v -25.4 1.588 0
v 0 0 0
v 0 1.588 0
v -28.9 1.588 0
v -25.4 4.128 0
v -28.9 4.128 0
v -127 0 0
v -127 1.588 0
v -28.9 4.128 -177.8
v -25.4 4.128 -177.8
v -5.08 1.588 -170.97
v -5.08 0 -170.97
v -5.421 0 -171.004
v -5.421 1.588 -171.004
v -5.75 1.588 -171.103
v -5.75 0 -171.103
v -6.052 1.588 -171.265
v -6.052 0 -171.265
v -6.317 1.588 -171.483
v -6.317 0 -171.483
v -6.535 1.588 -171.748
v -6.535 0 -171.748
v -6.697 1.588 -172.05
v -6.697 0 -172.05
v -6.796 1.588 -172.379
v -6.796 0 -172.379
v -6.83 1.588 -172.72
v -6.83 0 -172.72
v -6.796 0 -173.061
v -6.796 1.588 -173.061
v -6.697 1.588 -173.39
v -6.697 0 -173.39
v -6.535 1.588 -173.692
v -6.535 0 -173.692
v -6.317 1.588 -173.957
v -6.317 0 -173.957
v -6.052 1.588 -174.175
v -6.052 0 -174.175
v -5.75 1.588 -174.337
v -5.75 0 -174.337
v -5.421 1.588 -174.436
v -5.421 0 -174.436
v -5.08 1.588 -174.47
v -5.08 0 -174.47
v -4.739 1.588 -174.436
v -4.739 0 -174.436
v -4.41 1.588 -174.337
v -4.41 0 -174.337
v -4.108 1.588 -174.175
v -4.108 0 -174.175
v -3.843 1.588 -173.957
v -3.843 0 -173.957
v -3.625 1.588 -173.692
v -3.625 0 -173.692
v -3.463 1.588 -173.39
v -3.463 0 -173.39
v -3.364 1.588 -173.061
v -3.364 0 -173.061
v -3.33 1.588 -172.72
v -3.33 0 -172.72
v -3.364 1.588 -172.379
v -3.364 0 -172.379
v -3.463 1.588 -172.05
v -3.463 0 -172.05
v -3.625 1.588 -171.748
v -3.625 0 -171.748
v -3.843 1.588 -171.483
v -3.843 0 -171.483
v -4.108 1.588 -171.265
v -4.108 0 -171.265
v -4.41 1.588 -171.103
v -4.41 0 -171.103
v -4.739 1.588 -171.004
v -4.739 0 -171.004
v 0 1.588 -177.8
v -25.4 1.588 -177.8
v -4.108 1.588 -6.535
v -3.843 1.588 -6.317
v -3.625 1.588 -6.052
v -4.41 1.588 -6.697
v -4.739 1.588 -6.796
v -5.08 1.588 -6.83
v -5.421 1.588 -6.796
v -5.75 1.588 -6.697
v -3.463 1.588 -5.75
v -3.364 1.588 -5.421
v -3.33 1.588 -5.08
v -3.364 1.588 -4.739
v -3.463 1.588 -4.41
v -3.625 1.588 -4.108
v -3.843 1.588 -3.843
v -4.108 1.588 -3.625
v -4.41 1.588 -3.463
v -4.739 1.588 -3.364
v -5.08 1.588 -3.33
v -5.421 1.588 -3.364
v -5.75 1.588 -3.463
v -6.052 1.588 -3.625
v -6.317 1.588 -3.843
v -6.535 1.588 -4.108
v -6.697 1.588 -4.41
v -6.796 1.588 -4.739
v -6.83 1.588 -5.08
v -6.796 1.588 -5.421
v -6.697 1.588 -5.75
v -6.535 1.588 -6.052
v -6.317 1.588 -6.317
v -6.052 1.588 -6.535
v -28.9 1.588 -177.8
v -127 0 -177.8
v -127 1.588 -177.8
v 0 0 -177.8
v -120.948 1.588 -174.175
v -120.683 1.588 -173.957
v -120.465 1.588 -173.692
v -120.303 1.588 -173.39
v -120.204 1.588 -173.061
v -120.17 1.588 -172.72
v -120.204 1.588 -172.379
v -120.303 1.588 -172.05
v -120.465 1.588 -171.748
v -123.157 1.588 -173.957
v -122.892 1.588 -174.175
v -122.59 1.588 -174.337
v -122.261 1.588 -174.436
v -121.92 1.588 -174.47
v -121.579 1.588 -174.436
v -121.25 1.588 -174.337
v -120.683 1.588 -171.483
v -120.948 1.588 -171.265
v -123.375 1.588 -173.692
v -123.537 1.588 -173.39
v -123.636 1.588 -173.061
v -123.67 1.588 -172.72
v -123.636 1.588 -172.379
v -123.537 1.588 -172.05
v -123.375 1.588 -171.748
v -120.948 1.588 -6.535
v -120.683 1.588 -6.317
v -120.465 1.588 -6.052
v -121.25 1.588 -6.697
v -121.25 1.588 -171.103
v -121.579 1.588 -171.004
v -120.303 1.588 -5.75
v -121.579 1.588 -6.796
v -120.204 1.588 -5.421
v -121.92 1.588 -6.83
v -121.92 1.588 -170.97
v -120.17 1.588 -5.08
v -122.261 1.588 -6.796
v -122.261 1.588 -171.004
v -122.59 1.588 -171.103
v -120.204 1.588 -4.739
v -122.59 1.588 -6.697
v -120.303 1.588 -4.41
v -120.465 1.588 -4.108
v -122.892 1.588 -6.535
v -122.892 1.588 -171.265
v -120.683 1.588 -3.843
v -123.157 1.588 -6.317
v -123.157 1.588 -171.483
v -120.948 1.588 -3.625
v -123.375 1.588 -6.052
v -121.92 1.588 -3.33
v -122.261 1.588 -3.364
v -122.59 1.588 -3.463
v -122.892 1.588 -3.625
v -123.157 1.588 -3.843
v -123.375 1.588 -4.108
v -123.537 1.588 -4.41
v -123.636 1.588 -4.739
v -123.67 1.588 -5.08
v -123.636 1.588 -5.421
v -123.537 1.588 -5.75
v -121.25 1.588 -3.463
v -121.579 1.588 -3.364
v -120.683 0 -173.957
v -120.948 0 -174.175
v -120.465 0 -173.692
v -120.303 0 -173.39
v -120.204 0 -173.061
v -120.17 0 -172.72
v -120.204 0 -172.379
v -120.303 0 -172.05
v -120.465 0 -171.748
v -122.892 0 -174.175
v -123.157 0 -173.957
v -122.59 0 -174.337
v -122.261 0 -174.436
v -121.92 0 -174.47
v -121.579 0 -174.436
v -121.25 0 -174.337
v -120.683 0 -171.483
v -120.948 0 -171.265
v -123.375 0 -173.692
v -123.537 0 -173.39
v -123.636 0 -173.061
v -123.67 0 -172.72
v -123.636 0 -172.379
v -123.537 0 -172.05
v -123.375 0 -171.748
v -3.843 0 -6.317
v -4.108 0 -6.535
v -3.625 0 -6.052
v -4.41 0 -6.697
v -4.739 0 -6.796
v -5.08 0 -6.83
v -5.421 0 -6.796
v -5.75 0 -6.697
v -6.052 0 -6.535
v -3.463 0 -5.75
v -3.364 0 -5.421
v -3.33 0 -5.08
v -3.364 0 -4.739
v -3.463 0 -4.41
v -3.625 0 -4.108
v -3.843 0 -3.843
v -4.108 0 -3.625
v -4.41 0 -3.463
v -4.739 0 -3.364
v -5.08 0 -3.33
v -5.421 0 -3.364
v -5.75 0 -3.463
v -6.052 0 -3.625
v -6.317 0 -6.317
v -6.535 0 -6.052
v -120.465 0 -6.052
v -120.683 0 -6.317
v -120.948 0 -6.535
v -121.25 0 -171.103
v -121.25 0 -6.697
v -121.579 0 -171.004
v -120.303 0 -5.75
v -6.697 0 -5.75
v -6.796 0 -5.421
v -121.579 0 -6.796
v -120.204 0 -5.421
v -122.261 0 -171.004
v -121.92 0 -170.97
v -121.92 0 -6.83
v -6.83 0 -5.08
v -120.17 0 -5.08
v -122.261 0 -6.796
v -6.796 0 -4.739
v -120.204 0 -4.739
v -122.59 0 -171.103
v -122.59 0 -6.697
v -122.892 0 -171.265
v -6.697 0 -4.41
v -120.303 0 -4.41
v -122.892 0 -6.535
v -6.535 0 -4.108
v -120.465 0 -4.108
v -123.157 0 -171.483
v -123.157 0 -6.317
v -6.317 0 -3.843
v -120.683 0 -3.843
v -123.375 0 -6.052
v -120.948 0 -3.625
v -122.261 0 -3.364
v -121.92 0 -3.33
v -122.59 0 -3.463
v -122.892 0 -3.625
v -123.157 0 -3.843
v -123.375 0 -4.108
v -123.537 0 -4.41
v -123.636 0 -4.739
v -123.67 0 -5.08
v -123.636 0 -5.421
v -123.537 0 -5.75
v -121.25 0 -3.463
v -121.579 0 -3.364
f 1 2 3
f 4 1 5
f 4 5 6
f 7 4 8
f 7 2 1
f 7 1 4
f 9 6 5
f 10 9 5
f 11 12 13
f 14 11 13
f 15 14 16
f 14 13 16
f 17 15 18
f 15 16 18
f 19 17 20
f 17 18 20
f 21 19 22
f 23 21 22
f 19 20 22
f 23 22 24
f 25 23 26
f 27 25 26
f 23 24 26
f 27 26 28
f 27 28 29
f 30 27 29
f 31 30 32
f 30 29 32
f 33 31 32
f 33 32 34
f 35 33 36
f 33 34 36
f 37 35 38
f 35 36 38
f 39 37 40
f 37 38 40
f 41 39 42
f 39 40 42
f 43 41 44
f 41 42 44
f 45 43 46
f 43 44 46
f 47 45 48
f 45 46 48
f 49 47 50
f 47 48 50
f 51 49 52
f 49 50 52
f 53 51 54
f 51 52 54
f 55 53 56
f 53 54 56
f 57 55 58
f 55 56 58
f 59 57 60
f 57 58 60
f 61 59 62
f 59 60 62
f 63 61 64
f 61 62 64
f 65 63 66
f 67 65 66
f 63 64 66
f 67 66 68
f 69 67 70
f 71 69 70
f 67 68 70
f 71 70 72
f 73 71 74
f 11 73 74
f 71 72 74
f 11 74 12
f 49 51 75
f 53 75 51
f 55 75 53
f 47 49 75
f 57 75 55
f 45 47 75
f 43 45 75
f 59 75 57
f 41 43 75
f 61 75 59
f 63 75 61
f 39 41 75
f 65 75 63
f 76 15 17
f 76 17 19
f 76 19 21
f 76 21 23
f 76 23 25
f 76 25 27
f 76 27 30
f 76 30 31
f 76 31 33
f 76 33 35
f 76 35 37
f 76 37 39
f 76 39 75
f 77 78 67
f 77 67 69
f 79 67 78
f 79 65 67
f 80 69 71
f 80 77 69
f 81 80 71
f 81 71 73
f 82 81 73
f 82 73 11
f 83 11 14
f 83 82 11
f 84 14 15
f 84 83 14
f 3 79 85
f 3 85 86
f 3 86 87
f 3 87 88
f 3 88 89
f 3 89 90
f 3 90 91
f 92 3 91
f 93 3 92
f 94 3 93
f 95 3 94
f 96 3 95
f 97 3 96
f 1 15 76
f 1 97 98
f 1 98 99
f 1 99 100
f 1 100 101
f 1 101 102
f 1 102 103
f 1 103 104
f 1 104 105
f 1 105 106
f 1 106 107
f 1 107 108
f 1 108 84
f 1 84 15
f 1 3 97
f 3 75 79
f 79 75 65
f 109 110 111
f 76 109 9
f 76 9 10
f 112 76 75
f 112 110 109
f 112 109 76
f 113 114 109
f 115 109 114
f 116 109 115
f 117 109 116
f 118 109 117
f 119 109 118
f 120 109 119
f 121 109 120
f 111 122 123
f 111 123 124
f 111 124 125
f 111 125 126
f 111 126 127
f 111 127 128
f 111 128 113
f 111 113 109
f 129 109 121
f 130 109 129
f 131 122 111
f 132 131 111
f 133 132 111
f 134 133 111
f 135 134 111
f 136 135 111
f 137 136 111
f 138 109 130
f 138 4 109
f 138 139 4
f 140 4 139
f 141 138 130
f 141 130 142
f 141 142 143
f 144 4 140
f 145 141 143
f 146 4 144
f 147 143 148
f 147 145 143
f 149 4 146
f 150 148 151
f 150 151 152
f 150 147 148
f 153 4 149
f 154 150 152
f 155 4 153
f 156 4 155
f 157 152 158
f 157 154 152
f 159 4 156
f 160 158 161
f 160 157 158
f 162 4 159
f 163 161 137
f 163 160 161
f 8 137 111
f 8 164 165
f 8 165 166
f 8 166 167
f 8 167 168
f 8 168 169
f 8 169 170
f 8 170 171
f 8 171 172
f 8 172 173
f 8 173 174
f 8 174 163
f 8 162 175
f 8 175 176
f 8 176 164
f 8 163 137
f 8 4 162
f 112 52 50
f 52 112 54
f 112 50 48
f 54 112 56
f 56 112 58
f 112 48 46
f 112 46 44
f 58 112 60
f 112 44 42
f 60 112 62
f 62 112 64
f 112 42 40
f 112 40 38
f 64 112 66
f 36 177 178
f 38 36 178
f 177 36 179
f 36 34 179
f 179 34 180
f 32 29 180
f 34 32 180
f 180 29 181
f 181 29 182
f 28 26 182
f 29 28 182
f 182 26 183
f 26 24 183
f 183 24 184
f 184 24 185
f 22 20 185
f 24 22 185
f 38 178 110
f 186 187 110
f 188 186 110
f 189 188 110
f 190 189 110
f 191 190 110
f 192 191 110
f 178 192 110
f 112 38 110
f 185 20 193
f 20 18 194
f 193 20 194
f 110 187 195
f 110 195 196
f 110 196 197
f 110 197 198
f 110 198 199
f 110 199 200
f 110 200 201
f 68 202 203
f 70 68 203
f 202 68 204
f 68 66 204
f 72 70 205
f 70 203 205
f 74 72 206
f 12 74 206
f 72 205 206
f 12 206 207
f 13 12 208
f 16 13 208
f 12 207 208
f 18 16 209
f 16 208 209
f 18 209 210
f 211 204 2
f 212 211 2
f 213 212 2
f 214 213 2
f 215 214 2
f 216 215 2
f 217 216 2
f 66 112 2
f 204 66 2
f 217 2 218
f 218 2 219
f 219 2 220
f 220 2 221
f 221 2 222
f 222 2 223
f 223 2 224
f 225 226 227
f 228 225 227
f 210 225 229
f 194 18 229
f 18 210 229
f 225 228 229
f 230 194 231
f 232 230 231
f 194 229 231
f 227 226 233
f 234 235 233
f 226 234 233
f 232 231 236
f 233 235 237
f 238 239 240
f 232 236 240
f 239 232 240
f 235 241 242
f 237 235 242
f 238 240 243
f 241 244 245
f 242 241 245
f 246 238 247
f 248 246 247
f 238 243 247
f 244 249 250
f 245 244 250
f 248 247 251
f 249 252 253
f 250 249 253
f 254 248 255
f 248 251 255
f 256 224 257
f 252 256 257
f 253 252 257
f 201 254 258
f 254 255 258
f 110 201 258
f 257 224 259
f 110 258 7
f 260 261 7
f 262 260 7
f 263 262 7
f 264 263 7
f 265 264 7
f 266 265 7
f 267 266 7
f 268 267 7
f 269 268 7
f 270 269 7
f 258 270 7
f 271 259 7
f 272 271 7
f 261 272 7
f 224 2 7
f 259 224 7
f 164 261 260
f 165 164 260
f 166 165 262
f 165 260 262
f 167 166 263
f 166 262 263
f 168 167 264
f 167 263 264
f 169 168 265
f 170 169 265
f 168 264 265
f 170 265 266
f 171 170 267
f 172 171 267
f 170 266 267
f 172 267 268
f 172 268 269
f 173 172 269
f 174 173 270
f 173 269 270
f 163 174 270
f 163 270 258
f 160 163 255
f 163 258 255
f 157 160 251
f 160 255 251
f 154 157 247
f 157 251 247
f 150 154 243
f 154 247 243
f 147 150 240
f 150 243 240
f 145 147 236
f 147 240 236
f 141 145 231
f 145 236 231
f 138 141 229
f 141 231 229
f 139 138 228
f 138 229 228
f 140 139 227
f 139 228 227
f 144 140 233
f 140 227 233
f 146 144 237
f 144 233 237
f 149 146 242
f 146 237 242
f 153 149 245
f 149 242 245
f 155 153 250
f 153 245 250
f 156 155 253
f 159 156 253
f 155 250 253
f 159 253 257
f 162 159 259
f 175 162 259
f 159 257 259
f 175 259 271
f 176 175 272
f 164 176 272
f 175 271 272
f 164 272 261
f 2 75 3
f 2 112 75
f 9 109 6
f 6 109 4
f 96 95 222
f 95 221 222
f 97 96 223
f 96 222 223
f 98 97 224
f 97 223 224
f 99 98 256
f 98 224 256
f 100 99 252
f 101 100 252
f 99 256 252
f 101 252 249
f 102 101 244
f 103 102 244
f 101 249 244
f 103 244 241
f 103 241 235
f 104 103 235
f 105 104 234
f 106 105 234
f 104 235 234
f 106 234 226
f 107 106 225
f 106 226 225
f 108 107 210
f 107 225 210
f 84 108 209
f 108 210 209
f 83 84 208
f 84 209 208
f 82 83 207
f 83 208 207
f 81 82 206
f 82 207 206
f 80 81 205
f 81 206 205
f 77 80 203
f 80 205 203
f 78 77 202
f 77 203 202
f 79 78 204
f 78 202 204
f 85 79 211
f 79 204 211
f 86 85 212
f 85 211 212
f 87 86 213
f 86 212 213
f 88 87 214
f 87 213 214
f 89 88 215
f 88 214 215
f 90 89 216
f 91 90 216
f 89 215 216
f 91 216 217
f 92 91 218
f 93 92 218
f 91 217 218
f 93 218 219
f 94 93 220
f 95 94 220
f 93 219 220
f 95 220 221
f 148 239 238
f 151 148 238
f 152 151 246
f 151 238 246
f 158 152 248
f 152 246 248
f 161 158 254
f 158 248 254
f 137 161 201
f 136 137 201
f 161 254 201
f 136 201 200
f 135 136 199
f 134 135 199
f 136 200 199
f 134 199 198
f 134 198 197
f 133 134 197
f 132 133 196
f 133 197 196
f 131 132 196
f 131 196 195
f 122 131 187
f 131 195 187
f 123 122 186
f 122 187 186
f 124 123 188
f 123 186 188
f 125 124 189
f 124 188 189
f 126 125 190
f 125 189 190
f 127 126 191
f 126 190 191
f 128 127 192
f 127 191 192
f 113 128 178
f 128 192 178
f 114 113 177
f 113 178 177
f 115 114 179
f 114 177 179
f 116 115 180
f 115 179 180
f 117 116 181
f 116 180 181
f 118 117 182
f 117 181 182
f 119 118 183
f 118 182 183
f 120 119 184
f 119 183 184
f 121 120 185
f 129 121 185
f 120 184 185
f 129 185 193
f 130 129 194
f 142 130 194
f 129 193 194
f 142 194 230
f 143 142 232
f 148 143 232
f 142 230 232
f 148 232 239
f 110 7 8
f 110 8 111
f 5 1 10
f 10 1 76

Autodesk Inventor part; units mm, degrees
ref_plane "YZ Plane" through (0, 0, 0) normal (1, 0, 0) x (0, 1, 0)
ref_plane "XZ Plane" through (0, 0, 0) normal (0, 1, 0) x (-1, 0, 0)
ref_plane "XY Plane" through (0, 0, 0) normal (0, 0, 1) x (1, 0, 0)
sketch "Sketch1" plane through (0, 0, 0) normal (0, 1, 0) x (-1, 0, 0)
  line L0 (0, 0) -> (127, 0)
  line L1 (127, 0) -> (127, -177.8)
  line L2 (127, -177.8) -> (0, -177.8)
  line L3 (0, -177.8) -> (0, 0)
  dimension "d0" = 127
  dimension "d1" = 177.8
extrude "Extrusion1" add sketch "Sketch1" along normal blind 1.5875
sketch "Sketch2" plane through (0, 1.5875, 0) normal (0, 1, 0) x (1, 0, 0)
  line L0 (-127, 177.8) -> (-127, 0) projected
  line L1 (0, 177.8) -> (-127, 177.8) projected
  line L2 (0, 0) -> (0, 177.8) projected
  line L3 (-127, 0) -> (0, 0) projected
  point P0 (-121.92, 172.72)
  point P1 (-5.08, 172.72)
  point P2 (-5.08, 5.08)
  point P3 (-121.92, 5.08)
  dimension "d4" = 5.08
  dimension "d5" = 5.08
  dimension "d6" = 5.08
  dimension "d7" = 5.08
  dimension "d8" = 5.08
  dimension "d9" = 5.08
  dimension "d10" = 5.08
  dimension "d11" = 5.08
hole "Hole1" at (-121.92, 1.5875, -172.72) at (-5.08, 1.5875, -172.72) at (-5.08, 1.5875, -5.08) at (-121.92, 1.5875, -5.08) direction (0, -1, 0) diameter 3.5 end through all
sketch "Sketch3" plane through (0, 1.5875, 0) normal (0, 1, 0) x (1, 0, 0)
  circle A0 centre (-5.08, 5.08) radius 1.75 projected
  circle A1 centre (-121.92, 172.72) radius 1.75 projected
  circle A2 centre (-5.08, 172.72) radius 1.75 projected
  circle A3 centre (-121.92, 5.08) radius 1.75 projected
  line L0 (-127, 0) -> (0, 0) projected
  line L1 (0, 0) -> (0, 177.8) projected
  line L2 (0, 177.8) -> (-127, 177.8) projected
  line L3 (-127, 177.8) -> (-127, 0) projected
  line L4 (-127, 0) -> (0, 0) projected
  line L5 (0, 177.8) -> (-127, 177.8) projected
  line L6 (-28.9, 0) -> (-25.4, 0)
  line L7 (-25.4, 0) -> (-25.4, 177.8)
  line L8 (-25.4, 177.8) -> (-28.9, 177.8)
  line L9 (-28.9, 177.8) -> (-28.9, 0)
  dimension "d19" = 3.5
  dimension "d23" = 25.4
extrude "Extrusion2" add sketch "Sketch3" along normal blind 2.54 contours L9 L2 L7 L0
properties part number "MockPCB"
